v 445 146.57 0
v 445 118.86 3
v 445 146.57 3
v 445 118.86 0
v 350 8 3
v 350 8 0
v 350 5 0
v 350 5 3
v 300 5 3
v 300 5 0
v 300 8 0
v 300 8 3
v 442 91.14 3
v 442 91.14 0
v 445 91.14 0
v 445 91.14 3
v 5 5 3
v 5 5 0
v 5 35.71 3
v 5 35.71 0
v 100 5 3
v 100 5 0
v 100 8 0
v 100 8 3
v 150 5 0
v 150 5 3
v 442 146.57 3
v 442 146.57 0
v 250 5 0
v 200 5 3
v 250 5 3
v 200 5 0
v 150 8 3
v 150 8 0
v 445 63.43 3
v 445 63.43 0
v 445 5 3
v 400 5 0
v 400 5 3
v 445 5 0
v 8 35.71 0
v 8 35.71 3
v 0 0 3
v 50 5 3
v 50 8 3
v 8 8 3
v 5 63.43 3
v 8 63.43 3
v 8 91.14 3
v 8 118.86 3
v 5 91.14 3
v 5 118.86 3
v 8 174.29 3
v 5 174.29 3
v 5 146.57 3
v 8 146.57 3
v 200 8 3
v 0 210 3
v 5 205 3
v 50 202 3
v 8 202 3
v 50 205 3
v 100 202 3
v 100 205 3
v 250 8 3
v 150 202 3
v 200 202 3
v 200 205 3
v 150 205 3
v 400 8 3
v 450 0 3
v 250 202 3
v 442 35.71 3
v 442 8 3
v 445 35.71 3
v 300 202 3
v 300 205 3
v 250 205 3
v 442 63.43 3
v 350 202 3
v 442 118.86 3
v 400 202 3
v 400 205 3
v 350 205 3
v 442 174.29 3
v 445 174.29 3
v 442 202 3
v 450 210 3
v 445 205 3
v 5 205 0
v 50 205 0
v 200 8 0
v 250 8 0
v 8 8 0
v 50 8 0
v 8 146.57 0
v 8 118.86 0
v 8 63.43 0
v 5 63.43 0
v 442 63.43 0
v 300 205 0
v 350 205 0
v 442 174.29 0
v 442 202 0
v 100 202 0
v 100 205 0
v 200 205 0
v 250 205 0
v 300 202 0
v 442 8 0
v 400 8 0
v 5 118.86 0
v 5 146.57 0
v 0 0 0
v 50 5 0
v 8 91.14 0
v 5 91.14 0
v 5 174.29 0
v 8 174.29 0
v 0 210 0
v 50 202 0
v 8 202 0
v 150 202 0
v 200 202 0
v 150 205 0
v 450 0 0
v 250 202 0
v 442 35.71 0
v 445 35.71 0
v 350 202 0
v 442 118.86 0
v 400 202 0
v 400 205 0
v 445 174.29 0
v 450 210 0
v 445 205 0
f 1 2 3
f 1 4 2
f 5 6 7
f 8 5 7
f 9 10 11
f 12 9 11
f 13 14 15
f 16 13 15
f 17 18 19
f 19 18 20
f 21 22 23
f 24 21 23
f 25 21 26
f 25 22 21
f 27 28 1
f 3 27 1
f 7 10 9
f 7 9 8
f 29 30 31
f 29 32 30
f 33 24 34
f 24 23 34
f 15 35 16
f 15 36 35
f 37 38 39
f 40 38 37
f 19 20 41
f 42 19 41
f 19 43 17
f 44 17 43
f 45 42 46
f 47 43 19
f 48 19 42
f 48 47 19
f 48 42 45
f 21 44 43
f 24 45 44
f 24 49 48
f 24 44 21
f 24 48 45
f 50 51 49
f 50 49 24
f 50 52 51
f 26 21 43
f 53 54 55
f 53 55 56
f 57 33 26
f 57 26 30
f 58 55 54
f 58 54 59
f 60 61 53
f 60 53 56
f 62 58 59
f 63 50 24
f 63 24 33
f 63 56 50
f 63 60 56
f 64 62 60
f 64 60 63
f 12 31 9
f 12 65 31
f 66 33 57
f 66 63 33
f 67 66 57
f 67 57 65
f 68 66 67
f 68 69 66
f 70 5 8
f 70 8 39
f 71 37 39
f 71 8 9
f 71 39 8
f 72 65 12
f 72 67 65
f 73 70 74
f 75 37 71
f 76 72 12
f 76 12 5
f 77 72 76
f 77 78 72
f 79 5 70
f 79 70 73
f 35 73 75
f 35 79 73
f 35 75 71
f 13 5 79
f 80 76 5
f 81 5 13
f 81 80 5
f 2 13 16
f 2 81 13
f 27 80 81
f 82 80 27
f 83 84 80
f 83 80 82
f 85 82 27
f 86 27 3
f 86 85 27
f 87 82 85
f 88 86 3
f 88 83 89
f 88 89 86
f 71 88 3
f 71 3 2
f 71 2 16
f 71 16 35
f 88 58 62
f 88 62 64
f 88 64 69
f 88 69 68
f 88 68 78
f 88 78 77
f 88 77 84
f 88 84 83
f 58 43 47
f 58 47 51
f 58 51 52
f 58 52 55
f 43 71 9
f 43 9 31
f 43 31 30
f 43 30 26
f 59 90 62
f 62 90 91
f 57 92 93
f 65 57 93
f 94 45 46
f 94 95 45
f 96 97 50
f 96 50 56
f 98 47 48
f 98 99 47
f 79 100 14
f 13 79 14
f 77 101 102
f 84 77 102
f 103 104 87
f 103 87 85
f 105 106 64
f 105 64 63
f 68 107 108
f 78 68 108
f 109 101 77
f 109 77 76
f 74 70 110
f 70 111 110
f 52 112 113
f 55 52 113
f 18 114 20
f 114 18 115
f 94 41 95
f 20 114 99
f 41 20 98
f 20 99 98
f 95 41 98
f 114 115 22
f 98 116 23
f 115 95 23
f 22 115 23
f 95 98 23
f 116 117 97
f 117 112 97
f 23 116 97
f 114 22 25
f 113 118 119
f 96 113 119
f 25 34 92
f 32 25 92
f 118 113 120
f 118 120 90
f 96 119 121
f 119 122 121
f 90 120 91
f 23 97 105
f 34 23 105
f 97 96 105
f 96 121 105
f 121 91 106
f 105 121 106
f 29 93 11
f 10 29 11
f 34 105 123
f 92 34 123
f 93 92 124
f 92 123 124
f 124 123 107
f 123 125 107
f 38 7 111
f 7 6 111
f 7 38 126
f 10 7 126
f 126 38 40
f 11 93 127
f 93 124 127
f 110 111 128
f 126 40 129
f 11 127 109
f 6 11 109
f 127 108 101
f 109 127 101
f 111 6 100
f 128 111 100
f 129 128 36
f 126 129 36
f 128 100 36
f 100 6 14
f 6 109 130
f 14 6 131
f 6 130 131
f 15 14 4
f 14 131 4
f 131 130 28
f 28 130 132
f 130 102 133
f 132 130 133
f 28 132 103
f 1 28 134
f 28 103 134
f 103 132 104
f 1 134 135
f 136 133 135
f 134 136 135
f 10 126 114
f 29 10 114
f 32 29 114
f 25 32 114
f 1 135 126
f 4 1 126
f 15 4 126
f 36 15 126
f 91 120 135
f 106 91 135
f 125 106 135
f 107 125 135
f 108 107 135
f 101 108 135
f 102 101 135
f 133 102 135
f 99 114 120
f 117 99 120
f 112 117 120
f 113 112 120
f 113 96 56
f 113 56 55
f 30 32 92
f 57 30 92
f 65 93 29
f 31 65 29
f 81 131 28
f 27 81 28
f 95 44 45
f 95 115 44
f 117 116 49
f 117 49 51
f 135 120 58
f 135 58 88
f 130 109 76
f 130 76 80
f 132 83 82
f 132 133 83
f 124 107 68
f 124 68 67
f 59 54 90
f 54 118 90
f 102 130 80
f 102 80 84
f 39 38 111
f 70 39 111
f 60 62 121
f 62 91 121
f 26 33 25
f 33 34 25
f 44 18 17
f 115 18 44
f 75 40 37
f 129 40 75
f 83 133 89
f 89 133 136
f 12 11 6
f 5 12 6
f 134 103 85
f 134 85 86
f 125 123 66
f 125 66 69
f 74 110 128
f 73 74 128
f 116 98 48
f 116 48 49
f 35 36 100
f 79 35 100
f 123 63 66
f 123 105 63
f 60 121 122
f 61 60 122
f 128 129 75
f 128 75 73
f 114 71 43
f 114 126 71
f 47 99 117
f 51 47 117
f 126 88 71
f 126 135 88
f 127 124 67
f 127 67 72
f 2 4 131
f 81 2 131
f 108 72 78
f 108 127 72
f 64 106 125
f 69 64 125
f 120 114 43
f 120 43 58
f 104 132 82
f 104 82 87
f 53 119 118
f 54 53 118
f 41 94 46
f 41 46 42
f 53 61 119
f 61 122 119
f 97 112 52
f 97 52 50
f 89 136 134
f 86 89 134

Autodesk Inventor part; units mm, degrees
ref_plane "YZ Plane" through (0, 0, 0) normal (1, 0, 0) x (0, 1, 0)
ref_plane "XZ Plane" through (0, 0, 0) normal (0, 1, 0) x (-1, 0, 0)
ref_plane "XY Plane" through (0, 0, 0) normal (0, 0, 1) x (1, 0, 0)
sketch "Boceto1" plane through (0, 0, 0) normal (0, 0, 1) x (1, 0, 0)
  line L0 (0, 0) -> (0, 210)
  line L1 (0, 210) -> (450, 210)
  line L2 (450, 210) -> (450, 0)
  line L3 (450, 0) -> (0, 0)
  line L4 (5, 5) -> (50, 5)
  line L5 (50, 5) -> (50, 8)
  line L6 (5, 5) -> (5, 35.71)
  line L7 (5, 35.71) -> (8, 35.71)
  line L8 (50, 8) -> (8, 8)
  line L9 (8, 8) -> (8, 35.71)
  line L10 (5, 63.43) -> (5, 91.14)
  line L11 (5, 118.86) -> (5, 146.57)
  line L12 (5, 174.29) -> (5, 205)
  line L13 (5, 63.43) -> (8, 63.43)
  line L14 (8, 63.43) -> (8, 91.14)
  line L15 (8, 91.14) -> (5, 91.14)
  line L16 (5, 118.86) -> (8, 118.86)
  line L17 (8, 118.86) -> (8, 146.57)
  line L18 (8, 146.57) -> (5, 146.57)
  line L19 (5, 205) -> (50, 205)
  line L20 (50, 205) -> (50, 202)
  line L21 (50, 202) -> (8, 202)
  line L22 (8, 202) -> (8, 174.29)
  line L23 (8, 174.29) -> (5, 174.29)
  line L24 (100, 205) -> (150, 205)
  line L25 (200, 205) -> (250, 205)
  line L26 (300, 205) -> (350, 205)
  line L27 (400, 205) -> (445, 205)
  line L28 (100, 205) -> (100, 202)
  line L29 (100, 202) -> (150, 202)
  line L30 (150, 202) -> (150, 205)
  line L31 (200, 205) -> (200, 202)
  line L32 (200, 202) -> (250, 202)
  line L33 (250, 202) -> (250, 205)
  line L34 (300, 205) -> (300, 202)
  line L35 (300, 202) -> (350, 202)
  line L36 (350, 202) -> (350, 205)
  line L37 (445, 205) -> (445, 174.29)
  line L38 (400, 205) -> (400, 202)
  line L39 (400, 202) -> (442, 202)
  line L40 (442, 202) -> (442, 174.29)
  line L41 (442, 174.29) -> (445, 174.29)
  line L42 (100, 5) -> (150, 5)
  line L43 (200, 5) -> (250, 5)
  line L44 (300, 5) -> (350, 5)
  line L45 (400, 5) -> (445, 5)
  line L46 (100, 5) -> (100, 8)
  line L47 (100, 8) -> (150, 8)
  line L48 (150, 8) -> (150, 5)
  line L49 (200, 5) -> (200, 8)
  line L50 (200, 8) -> (250, 8)
  line L51 (250, 8) -> (250, 5)
  line L52 (300, 5) -> (300, 8)
  line L53 (300, 8) -> (350, 8)
  line L54 (350, 8) -> (350, 5)
  line L55 (445, 5) -> (445, 35.71)
  line L56 (445, 35.71) -> (442, 35.71)
  line L57 (400, 5) -> (400, 8)
  line L58 (400, 8) -> (442, 8)
  line L59 (442, 8) -> (442, 35.71)
  line L60 (445, 63.43) -> (445, 91.14)
  line L61 (445, 118.86) -> (445, 146.57)
  line L62 (445, 63.43) -> (442, 63.43)
  line L63 (442, 63.43) -> (442, 91.14)
  line L64 (442, 91.14) -> (445, 91.14)
  line L65 (445, 118.86) -> (442, 118.86)
  line L66 (442, 118.86) -> (442, 146.57)
  line L67 (442, 146.57) -> (445, 146.57)
  dimension "d0" = 210
  dimension "d1" = 450
  dimension "d2" = 210
  dimension "d3" = 45
  dimension "d4" = 3
  dimension "d5" = 30.71
  dimension "d7" = 42
  dimension "d8" = 3
  dimension "d9" = 27.72
  dimension "d10" = 27.71
  dimension "d11" = 27.72
  dimension "d12" = 27.71
  dimension "d13" = 27.72
  dimension "d14" = 30.71
  dimension "d15" = 3
  dimension "d16" = 27.71
  dimension "d17" = 3
  dimension "d18" = 27.71
  dimension "d19" = 45
  dimension "d20" = 3
  dimension "d21" = 42
  dimension "d22" = 50
  dimension "d23" = 50
  dimension "d24" = 50
  dimension "d25" = 50
  dimension "d26" = 50
  dimension "d27" = 50
  dimension "d28" = 50
  dimension "d29" = 45
  dimension "d31" = 3
  dimension "d32" = 50
  dimension "d33" = 3
  dimension "d34" = 50
  dimension "d35" = 3
  dimension "d36" = 50
  dimension "d37" = 30.71
  dimension "d38" = 3
  dimension "d39" = 42
  dimension "d40" = 50
  dimension "d41" = 50
  dimension "d42" = 50
  dimension "d43" = 50
  dimension "d44" = 50
  dimension "d45" = 50
  dimension "d46" = 50
  dimension "d47" = 45
  dimension "d51" = 3
  dimension "d52" = 50
  dimension "d53" = 3
  dimension "d54" = 50
  dimension "d55" = 3
  dimension "d56" = 50
  dimension "d57" = 30.71
  dimension "d58" = 3
  dimension "d59" = 3
  dimension "d60" = 27.72
  dimension "d61" = 27.71
  dimension "d62" = 27.72
  dimension "d63" = 27.71
  dimension "d64" = 3
  dimension "d65" = 3
  dimension "d69" = 5
  dimension "d71" = 5
  dimension "d72" = 5
extrude "Extrusión1" add sketch "Boceto1" along normal blind 3
properties part number "Cara frontal 2" material "Madera (cerezo)"
